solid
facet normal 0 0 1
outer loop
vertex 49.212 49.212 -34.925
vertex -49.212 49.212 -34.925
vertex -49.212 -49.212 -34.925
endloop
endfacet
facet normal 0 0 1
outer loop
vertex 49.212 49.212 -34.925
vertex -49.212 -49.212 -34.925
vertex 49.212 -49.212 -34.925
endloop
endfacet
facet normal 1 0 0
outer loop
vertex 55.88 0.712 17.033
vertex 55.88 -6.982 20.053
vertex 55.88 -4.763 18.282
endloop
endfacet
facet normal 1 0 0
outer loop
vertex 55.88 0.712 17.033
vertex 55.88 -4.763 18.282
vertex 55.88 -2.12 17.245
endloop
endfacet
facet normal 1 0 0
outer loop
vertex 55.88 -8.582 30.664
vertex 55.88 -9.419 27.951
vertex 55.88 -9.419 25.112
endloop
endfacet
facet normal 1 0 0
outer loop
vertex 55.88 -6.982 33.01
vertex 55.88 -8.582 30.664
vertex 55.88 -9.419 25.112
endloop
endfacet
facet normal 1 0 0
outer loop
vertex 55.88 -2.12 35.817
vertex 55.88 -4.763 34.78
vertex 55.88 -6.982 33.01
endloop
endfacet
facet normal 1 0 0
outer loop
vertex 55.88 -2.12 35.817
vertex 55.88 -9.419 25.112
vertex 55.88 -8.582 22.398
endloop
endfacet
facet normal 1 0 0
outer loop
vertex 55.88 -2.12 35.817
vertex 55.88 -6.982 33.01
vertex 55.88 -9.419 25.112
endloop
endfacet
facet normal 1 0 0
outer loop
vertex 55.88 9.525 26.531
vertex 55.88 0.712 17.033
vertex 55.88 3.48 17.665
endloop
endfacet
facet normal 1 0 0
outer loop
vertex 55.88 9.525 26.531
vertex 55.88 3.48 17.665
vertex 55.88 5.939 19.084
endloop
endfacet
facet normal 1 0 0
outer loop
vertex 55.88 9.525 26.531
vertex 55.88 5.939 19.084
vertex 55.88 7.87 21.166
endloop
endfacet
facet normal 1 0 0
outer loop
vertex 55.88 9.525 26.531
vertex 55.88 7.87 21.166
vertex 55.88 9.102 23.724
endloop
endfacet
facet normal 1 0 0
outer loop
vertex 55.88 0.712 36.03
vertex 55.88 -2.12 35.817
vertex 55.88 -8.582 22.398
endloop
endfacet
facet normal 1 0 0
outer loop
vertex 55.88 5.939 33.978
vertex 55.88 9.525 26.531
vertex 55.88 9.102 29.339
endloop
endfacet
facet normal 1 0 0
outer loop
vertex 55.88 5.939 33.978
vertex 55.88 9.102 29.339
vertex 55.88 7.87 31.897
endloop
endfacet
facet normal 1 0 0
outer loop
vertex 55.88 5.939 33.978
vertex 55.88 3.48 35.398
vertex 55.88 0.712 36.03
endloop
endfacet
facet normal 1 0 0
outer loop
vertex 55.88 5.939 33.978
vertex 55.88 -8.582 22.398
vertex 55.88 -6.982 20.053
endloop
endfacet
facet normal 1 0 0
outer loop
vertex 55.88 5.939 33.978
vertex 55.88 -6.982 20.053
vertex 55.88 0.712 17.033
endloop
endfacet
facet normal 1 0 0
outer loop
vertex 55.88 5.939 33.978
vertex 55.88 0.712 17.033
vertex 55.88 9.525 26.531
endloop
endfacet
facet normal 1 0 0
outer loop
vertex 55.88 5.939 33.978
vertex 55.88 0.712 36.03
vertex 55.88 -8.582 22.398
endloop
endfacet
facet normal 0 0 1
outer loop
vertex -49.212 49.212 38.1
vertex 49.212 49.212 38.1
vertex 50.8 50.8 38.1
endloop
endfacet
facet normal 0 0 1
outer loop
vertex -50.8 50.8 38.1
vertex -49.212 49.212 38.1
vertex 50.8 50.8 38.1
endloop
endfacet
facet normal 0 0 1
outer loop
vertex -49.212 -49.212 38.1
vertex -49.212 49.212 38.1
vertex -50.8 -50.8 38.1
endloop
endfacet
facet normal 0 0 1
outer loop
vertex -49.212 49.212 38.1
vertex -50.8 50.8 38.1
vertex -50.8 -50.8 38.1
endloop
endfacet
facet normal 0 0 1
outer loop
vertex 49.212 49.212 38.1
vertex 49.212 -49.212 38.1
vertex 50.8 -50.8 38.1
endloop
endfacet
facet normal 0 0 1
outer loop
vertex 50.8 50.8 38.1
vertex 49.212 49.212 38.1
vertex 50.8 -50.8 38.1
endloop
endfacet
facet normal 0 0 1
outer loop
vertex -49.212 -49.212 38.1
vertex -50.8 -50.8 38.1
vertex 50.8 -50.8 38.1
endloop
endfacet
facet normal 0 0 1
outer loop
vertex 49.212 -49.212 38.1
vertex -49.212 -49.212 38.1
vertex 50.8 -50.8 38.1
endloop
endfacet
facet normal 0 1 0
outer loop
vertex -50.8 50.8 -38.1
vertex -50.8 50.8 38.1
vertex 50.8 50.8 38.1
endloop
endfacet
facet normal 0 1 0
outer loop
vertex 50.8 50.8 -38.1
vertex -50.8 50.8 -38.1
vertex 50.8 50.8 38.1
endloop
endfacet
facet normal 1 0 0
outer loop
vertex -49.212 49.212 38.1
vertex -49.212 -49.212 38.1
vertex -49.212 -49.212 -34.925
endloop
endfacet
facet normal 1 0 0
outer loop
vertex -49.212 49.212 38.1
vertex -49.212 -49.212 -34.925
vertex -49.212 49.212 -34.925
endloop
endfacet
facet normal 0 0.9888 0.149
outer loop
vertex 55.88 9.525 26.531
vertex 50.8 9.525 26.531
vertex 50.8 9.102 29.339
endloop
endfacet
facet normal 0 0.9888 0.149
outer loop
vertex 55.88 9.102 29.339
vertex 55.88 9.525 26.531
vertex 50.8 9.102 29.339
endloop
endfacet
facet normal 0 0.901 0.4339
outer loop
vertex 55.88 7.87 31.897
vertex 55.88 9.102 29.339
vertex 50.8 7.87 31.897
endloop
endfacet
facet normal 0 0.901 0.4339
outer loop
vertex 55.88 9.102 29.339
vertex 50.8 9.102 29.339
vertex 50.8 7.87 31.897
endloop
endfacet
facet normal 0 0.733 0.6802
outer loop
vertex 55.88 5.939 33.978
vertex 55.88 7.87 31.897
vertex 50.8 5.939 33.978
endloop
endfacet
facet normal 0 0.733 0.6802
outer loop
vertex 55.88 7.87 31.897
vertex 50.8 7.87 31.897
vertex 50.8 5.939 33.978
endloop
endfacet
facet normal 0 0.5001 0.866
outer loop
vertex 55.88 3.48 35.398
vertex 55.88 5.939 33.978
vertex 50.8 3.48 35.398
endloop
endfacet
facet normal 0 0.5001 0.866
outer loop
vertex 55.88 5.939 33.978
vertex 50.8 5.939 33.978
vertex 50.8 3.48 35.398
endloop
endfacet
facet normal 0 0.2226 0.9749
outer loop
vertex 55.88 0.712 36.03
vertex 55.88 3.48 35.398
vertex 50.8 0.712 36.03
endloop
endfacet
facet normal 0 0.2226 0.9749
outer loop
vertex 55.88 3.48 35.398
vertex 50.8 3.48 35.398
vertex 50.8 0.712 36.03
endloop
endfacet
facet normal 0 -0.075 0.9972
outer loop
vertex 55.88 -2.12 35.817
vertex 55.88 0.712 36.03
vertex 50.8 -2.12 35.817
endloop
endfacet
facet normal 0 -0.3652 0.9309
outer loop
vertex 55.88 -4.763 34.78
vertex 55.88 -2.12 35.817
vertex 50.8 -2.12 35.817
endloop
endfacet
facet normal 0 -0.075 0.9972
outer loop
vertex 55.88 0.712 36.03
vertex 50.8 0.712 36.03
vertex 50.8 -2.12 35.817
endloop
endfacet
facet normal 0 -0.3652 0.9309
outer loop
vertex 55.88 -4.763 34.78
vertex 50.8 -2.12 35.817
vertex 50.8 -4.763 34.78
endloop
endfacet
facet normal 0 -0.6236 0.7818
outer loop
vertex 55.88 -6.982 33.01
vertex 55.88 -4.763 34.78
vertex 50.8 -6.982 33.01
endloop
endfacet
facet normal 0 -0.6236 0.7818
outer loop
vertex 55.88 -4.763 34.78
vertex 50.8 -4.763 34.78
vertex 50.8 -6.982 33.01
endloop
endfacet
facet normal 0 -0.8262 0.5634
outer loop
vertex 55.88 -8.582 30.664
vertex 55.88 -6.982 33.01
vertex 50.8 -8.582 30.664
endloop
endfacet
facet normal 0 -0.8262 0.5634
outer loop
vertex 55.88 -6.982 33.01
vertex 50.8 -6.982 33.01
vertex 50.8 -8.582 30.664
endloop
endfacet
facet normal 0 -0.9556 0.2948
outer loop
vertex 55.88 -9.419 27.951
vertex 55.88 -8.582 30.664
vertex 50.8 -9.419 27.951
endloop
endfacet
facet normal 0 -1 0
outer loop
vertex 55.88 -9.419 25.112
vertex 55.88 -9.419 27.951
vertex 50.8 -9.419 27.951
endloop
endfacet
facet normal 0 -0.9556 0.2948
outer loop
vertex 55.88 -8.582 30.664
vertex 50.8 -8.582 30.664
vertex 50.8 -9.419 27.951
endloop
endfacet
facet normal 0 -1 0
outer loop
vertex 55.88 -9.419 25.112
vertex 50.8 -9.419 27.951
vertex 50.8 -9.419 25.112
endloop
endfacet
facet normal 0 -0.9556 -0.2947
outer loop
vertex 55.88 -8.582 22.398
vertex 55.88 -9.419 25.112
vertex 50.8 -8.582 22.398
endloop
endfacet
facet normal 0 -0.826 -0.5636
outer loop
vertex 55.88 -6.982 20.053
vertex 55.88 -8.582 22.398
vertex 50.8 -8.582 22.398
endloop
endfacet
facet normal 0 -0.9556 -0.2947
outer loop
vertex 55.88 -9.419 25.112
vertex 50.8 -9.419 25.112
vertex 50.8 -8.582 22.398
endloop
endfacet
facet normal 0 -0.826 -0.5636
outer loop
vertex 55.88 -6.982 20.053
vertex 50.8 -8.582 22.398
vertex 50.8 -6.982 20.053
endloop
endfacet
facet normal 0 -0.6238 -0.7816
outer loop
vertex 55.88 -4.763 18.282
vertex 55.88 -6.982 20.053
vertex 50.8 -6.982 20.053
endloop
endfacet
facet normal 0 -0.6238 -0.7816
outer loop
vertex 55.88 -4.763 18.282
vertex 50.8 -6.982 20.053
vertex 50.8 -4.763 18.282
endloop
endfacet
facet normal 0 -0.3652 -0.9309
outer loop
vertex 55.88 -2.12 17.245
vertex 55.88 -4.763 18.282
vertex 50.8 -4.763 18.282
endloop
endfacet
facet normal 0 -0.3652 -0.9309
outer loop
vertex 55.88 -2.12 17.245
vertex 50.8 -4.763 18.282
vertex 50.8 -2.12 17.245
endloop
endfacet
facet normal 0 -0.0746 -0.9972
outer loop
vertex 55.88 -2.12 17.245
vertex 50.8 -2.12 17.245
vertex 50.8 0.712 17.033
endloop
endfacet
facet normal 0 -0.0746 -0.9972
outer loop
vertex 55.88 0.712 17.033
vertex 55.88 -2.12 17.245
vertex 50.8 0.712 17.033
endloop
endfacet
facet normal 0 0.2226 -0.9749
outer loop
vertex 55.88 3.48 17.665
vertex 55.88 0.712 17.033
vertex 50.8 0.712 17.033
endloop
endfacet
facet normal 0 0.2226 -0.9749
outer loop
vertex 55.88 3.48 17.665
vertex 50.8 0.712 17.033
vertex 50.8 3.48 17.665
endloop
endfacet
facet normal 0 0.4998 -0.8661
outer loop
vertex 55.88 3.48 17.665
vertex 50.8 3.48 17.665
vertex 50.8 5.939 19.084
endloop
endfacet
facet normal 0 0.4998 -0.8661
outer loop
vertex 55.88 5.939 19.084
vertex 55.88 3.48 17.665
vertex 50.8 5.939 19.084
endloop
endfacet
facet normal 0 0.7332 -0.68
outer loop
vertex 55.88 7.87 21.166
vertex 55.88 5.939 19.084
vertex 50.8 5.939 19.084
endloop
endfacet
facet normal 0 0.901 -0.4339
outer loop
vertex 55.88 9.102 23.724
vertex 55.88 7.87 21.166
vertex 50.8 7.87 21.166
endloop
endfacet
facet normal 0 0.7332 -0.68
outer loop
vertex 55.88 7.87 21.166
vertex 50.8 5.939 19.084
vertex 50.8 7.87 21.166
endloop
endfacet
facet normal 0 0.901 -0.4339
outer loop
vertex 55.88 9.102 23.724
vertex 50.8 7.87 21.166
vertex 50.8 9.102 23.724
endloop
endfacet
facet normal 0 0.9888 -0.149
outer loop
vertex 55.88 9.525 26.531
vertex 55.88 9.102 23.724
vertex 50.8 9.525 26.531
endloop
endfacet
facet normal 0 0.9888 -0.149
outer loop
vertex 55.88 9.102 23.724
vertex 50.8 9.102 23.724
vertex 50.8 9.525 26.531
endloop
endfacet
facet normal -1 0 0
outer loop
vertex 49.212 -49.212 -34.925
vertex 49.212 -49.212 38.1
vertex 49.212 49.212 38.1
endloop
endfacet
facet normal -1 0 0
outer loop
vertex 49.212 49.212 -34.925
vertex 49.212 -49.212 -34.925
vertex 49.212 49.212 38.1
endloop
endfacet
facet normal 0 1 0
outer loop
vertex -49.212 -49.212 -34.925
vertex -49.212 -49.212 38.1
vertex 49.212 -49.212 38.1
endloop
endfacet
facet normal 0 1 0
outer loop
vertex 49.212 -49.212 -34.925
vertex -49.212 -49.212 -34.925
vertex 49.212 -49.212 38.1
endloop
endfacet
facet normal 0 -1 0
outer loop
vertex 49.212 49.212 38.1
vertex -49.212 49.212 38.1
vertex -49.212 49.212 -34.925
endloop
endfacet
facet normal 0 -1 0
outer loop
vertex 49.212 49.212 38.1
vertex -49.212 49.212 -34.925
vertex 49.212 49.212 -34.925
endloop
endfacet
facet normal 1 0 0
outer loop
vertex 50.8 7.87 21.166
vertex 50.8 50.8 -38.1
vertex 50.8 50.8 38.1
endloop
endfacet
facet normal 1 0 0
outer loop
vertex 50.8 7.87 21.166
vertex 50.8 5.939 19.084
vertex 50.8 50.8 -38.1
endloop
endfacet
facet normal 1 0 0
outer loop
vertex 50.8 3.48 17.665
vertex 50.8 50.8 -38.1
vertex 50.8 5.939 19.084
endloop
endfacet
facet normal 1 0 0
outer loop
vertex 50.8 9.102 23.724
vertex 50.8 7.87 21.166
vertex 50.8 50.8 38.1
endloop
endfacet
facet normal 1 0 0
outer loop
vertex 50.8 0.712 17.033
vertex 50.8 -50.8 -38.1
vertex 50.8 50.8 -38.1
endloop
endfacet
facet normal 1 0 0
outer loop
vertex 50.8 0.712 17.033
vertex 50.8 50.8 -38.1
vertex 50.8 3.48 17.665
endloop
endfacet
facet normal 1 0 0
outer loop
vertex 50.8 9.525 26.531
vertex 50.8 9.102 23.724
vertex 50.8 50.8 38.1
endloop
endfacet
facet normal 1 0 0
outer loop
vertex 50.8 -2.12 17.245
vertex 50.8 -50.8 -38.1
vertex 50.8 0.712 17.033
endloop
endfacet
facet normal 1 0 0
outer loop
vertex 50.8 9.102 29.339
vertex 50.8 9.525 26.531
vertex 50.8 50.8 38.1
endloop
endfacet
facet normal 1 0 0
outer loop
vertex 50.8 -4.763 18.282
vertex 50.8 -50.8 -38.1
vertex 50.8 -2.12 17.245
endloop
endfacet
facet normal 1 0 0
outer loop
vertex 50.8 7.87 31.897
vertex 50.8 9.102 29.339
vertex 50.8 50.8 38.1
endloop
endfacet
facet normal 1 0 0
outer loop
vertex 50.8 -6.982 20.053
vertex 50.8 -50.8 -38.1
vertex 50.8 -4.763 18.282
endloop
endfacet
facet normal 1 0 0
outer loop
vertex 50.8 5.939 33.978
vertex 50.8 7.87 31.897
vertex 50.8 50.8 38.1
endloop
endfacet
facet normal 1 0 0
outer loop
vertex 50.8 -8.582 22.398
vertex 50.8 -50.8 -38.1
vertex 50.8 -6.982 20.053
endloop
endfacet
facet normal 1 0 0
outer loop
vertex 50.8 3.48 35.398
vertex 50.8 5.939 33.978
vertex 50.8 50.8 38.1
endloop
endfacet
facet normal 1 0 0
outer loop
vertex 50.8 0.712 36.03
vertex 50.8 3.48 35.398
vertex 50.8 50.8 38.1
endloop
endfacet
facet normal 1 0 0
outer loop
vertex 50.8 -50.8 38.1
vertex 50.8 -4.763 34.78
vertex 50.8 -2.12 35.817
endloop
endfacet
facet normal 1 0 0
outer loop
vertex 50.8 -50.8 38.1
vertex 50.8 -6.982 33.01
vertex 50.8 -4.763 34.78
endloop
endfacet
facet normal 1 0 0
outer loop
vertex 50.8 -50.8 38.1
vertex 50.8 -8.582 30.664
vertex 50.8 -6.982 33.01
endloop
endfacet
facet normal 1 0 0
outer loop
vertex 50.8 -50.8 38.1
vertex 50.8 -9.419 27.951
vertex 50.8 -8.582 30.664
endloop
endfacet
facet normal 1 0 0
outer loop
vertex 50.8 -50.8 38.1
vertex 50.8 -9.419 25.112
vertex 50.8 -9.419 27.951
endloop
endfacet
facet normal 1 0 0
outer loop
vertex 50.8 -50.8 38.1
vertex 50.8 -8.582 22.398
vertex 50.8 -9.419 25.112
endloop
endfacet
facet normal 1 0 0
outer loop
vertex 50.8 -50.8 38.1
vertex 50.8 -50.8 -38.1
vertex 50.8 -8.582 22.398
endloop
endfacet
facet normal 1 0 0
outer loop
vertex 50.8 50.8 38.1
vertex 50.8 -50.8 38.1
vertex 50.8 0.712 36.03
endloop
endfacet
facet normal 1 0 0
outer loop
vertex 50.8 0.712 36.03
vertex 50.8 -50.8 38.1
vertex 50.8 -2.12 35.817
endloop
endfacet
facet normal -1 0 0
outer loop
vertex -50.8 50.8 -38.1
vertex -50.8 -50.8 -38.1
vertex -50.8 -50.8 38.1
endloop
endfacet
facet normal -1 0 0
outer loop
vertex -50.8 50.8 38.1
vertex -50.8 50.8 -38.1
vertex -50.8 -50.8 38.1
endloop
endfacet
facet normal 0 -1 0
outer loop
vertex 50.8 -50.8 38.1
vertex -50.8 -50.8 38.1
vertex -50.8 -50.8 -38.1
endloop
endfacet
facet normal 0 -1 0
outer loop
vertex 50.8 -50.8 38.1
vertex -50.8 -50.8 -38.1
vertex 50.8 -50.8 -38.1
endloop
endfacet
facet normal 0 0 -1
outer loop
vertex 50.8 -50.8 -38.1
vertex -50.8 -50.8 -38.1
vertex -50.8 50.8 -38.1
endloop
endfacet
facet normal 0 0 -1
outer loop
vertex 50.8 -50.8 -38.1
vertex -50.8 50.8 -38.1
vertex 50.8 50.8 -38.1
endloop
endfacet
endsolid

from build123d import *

# Parameters (mm, degrees)
F0_W     = 101.6
F0_H     = 76.2
F1_DEPTH = 50.8
F2_W     = 98.425
F2_H     = 98.425
F3_DEPTH = 73.025
F4_R     = 9.525
F5_DEPTH = 5.08


with BuildPart() as f1:
    # F0 (on Front) → F1 (new body, symmetric)
    with BuildSketch(Plane.XZ):
        Rectangle(F0_W, F0_H)
    extrude(amount=F1_DEPTH, both=True)

    # F2 (on face) → F3 (cut)
    with BuildSketch(Plane.XY.offset(38.1)):
        Rectangle(F2_W, F2_H)
    extrude(amount=-F3_DEPTH, mode=Mode.SUBTRACT)

    # F4 (on face) → F5 (join)
    with BuildSketch(Plane.YZ.offset(50.8)):
        with Locations((0, 26.531227)):
            Circle(F4_R)
    extrude(amount=F5_DEPTH)


solid = f1.part
